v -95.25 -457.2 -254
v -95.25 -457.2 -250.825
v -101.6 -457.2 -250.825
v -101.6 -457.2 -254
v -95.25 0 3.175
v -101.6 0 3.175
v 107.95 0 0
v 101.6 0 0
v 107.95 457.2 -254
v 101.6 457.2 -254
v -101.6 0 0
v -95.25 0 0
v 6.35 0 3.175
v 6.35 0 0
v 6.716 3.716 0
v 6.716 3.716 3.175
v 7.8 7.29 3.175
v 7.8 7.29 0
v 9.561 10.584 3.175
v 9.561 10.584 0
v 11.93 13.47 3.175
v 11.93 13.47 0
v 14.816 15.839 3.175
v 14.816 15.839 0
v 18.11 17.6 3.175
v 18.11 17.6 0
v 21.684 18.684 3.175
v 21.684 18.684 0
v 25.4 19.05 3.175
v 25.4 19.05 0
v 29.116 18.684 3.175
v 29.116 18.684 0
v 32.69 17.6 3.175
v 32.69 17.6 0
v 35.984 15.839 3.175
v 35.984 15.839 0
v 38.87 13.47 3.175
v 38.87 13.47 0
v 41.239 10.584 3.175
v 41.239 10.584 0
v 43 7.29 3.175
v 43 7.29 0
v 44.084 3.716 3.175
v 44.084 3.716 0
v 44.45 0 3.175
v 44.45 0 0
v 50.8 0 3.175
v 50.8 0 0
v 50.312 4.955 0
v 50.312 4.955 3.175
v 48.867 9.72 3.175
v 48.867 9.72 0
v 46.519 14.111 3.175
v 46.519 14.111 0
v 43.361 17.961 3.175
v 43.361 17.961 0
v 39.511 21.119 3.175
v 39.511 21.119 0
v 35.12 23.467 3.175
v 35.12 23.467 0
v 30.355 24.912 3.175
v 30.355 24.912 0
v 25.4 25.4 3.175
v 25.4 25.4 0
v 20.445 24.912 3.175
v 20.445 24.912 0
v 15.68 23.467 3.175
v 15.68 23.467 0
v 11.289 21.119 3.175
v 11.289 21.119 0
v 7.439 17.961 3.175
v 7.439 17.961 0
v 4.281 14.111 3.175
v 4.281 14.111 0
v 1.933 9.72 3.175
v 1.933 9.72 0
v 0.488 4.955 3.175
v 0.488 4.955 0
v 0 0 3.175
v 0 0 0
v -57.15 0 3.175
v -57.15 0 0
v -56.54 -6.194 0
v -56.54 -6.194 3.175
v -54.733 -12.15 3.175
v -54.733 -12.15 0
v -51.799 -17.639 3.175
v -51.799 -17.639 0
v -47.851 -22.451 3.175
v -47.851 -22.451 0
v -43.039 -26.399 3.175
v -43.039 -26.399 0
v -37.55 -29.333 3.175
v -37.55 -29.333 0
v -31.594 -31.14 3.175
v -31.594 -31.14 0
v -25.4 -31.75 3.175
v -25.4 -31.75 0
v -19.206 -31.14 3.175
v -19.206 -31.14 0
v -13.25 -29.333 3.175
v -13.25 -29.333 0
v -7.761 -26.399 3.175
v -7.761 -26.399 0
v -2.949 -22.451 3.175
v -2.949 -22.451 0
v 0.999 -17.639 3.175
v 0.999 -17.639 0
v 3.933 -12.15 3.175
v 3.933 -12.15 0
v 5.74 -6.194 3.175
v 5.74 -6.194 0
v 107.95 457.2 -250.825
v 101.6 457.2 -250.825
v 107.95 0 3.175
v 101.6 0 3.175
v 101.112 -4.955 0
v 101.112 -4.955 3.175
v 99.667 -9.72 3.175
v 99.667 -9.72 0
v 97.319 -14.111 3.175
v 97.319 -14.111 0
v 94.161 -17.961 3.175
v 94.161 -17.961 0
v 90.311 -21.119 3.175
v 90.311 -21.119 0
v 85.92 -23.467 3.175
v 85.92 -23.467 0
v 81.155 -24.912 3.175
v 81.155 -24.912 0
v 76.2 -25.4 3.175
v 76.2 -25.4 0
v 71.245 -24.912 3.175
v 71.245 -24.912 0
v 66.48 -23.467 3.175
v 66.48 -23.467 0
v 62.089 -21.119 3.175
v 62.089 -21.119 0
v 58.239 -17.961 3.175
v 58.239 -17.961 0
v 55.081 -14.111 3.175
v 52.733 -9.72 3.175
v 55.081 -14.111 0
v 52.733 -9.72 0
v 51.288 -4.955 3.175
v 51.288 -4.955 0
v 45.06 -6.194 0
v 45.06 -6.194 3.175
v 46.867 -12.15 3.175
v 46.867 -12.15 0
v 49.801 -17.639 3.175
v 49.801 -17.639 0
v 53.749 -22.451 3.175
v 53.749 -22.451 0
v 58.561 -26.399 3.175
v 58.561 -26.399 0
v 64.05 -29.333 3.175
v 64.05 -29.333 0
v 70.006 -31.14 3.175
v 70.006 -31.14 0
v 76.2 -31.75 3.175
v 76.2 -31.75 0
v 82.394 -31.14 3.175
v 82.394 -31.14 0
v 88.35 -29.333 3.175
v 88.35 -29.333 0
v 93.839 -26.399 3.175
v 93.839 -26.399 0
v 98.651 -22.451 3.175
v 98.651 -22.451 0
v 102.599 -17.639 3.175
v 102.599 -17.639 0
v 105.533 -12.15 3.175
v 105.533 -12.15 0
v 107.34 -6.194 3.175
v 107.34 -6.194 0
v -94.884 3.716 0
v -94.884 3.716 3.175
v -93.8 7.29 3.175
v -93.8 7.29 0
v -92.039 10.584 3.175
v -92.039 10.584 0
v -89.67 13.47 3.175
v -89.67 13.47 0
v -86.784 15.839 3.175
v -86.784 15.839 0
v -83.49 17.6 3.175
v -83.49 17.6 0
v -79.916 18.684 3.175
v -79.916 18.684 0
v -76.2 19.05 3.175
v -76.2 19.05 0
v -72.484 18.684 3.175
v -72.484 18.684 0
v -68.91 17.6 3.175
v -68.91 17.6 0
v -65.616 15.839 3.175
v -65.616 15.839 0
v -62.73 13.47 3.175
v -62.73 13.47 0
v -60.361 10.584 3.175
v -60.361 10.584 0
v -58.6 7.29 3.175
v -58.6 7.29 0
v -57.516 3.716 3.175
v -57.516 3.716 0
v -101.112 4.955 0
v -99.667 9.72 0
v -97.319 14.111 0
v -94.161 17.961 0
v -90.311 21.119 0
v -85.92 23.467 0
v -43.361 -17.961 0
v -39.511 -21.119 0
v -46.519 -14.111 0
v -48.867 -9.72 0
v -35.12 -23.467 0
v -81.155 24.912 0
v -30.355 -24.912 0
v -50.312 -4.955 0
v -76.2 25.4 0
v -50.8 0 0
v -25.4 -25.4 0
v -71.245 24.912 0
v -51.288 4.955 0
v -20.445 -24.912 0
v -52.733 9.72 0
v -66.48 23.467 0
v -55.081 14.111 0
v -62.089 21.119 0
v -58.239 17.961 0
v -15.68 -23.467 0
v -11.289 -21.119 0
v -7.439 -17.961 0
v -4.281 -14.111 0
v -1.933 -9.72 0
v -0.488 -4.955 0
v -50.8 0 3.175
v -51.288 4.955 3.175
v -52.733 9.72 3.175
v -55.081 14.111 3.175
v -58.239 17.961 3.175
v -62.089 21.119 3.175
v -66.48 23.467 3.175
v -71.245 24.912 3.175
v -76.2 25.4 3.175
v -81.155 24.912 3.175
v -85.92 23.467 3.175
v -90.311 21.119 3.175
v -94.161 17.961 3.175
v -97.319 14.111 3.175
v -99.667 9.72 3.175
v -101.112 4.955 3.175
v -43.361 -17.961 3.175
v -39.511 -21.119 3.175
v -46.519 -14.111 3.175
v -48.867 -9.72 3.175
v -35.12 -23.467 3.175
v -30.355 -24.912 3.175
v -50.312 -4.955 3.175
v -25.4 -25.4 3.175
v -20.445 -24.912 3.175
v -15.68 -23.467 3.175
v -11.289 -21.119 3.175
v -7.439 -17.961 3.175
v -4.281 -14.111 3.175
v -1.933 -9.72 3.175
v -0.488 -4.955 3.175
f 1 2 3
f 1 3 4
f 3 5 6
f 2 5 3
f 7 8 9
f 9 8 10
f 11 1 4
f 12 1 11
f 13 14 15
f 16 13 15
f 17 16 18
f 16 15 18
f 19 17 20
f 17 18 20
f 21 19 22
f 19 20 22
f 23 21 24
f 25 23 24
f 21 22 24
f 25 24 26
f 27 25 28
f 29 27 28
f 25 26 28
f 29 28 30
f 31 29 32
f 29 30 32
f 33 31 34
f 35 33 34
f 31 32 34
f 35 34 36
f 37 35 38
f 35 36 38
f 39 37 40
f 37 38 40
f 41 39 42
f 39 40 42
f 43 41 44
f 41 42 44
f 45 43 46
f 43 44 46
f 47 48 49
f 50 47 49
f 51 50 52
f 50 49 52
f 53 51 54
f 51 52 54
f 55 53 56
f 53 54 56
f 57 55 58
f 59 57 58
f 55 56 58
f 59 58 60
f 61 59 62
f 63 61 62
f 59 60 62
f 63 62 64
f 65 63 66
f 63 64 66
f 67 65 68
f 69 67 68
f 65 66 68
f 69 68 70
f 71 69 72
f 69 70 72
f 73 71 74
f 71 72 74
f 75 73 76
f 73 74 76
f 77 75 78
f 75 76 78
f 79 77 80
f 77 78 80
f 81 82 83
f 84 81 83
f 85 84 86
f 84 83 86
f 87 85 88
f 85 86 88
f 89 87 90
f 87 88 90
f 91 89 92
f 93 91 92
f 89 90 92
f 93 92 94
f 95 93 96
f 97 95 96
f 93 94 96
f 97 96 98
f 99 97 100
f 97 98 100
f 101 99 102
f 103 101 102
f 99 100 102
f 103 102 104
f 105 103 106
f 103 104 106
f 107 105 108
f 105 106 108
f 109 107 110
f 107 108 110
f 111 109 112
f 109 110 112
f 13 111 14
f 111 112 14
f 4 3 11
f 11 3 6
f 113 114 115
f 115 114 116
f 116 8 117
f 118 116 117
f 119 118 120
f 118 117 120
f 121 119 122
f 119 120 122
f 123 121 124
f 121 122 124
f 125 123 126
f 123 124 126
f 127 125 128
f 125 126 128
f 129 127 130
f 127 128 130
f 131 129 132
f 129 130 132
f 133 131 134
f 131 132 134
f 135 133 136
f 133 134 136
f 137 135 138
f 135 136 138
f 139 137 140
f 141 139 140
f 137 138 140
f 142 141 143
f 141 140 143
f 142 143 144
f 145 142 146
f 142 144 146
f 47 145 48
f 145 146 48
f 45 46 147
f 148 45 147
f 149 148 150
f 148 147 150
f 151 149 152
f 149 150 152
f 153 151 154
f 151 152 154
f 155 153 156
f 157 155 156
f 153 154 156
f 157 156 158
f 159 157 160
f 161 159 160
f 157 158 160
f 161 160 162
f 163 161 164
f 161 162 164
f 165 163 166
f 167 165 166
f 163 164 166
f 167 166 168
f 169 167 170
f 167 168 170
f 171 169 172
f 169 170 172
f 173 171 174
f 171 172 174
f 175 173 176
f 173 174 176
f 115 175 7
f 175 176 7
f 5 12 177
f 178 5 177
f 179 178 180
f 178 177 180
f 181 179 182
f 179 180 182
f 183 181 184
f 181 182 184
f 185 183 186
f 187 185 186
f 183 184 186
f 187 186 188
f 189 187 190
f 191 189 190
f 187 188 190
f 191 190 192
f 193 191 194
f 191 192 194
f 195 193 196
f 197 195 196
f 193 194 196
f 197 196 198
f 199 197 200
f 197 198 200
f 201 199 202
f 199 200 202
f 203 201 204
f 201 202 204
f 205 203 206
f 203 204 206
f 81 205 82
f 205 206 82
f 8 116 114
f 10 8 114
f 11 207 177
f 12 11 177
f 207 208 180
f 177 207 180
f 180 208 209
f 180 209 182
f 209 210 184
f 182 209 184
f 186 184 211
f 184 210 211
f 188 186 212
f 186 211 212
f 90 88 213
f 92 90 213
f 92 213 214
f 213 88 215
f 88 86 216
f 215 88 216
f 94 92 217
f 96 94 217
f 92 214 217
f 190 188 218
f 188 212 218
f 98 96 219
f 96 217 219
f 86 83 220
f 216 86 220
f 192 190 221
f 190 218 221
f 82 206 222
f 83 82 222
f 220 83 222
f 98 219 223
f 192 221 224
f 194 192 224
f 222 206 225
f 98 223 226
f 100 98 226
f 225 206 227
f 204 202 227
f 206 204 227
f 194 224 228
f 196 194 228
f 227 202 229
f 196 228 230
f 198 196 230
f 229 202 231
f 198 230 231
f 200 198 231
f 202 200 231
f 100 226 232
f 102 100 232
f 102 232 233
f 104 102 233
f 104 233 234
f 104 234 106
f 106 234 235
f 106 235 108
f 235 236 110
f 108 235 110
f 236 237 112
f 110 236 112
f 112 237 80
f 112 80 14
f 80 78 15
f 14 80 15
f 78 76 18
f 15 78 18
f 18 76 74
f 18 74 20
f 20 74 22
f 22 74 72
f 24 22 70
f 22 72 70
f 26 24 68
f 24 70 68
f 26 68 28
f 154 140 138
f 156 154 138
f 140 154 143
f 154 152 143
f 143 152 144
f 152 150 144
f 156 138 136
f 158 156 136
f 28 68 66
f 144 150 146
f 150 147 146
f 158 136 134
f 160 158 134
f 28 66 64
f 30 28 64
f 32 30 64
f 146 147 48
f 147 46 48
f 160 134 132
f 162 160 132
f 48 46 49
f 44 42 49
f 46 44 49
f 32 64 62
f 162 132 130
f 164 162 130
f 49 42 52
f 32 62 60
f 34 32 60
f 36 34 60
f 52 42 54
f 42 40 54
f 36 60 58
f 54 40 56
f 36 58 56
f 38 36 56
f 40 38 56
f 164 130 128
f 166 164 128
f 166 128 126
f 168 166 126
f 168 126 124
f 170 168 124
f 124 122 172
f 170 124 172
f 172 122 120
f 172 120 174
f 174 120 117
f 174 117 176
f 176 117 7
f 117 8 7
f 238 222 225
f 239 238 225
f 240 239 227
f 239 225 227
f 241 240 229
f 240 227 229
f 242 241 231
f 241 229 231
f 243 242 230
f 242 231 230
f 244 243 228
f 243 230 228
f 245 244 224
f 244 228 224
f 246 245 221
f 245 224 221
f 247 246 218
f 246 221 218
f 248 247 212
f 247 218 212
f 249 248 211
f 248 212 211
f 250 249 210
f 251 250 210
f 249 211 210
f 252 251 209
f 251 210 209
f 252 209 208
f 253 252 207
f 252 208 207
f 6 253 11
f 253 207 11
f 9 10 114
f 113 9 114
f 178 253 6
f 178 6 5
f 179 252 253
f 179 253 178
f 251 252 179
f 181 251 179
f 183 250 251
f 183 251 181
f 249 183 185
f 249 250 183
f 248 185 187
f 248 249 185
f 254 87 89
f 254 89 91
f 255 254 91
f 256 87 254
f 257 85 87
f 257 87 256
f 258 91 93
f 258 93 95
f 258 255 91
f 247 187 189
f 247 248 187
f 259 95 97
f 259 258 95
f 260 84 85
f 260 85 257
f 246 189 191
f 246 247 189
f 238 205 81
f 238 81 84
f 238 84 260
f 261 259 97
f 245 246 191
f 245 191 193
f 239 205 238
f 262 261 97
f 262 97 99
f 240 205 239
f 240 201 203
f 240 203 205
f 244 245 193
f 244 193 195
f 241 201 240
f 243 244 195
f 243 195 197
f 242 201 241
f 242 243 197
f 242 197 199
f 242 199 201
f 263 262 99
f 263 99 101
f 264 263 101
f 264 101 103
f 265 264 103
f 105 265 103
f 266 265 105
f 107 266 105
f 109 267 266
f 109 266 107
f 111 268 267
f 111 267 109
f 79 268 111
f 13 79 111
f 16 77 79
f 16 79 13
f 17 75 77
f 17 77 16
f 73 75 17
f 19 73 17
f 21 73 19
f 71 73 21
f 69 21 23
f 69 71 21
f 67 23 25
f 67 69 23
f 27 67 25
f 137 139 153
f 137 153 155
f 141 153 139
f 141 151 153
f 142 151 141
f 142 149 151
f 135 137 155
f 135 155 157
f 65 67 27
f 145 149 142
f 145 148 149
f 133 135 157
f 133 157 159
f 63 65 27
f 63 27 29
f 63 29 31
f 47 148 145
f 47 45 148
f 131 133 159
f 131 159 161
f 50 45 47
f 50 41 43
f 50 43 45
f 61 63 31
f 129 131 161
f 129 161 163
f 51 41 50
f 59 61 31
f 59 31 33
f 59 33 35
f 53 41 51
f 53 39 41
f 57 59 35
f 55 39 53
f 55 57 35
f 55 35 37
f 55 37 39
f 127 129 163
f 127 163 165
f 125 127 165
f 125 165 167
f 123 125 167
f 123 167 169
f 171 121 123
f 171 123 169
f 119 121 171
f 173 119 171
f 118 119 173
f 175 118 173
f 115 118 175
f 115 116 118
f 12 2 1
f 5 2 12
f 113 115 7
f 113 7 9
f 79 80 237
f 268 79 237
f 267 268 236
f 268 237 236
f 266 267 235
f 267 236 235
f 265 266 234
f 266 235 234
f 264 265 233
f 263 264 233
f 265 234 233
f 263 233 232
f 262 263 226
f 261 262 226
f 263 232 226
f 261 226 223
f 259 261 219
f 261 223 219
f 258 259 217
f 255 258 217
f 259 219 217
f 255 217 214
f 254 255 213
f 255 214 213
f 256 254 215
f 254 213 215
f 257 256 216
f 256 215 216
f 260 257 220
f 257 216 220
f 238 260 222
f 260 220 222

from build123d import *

# Parameters (mm, degrees)
F2_DEPTH = 101.6
F3_DEPTH = 95.25
F5_DEPTH = 107.95
F6_DEPTH = 101.6
F7_DEPTH = 3.175


with BuildPart() as f2:
    # F1 (on Right) → F2 (new body)
    with BuildSketch(Plane.YZ):
        Polygon((-457.2, -254), (0, 0), (0, 3.175), (-457.2, -250.825), align=None)
    extrude(amount=-F2_DEPTH)

    # F1 (on Right) → F3 (cut)
    with BuildSketch(Plane.YZ):
        Polygon((-457.2, -254), (0, 0), (0, 3.175), (-457.2, -250.825), align=None)
    extrude(amount=-F3_DEPTH, mode=Mode.SUBTRACT)



with BuildPart() as f5:
    # F4 (on Right) → F5 (new body)
    with BuildSketch(Plane.YZ):
        Polygon((0, 3.175), (0, 0), (457.2, -254), (457.2, -250.825), align=None)
    extrude(amount=F5_DEPTH)

    # F4 (on Right) → F6 (cut)
    with BuildSketch(Plane.YZ):
        Polygon((0, 3.175), (0, 0), (457.2, -254), (457.2, -250.825), align=None)
    extrude(amount=F6_DEPTH, mode=Mode.SUBTRACT)


with BuildPart() as f2_1:
    add(f2.part)

    add(f5.part)  # F7 merges F5
    # F0 (on Top) → F7 (join)
    with BuildSketch(Plane.XY):
        with BuildLine():
            ThreePointArc((0, 0), (-25.4, -25.4), (-50.8, 0))
            ThreePointArc((-50.8, 0), (-76.2, 25.4), (-101.6, 0))
            Line((-101.6, 0), (-95.25, 0))
            ThreePointArc((-95.25, 0), (-76.2, 19.05), (-57.15, 0))
            ThreePointArc((-57.15, 0), (-25.4, -31.75), (6.35, 0))
            ThreePointArc((6.35, 0), (25.4, 19.05), (44.45, 0))
            ThreePointArc((44.45, 0), (76.2, -31.75), (107.95, 0))
            Line((107.95, 0), (101.6, 0))
            ThreePointArc((101.6, 0), (76.2, -25.4), (50.8, 0))
            ThreePointArc((50.8, 0), (25.4, 25.4), (0, 0))
        make_face()
    extrude(amount=F7_DEPTH)


solid = f2_1.part
